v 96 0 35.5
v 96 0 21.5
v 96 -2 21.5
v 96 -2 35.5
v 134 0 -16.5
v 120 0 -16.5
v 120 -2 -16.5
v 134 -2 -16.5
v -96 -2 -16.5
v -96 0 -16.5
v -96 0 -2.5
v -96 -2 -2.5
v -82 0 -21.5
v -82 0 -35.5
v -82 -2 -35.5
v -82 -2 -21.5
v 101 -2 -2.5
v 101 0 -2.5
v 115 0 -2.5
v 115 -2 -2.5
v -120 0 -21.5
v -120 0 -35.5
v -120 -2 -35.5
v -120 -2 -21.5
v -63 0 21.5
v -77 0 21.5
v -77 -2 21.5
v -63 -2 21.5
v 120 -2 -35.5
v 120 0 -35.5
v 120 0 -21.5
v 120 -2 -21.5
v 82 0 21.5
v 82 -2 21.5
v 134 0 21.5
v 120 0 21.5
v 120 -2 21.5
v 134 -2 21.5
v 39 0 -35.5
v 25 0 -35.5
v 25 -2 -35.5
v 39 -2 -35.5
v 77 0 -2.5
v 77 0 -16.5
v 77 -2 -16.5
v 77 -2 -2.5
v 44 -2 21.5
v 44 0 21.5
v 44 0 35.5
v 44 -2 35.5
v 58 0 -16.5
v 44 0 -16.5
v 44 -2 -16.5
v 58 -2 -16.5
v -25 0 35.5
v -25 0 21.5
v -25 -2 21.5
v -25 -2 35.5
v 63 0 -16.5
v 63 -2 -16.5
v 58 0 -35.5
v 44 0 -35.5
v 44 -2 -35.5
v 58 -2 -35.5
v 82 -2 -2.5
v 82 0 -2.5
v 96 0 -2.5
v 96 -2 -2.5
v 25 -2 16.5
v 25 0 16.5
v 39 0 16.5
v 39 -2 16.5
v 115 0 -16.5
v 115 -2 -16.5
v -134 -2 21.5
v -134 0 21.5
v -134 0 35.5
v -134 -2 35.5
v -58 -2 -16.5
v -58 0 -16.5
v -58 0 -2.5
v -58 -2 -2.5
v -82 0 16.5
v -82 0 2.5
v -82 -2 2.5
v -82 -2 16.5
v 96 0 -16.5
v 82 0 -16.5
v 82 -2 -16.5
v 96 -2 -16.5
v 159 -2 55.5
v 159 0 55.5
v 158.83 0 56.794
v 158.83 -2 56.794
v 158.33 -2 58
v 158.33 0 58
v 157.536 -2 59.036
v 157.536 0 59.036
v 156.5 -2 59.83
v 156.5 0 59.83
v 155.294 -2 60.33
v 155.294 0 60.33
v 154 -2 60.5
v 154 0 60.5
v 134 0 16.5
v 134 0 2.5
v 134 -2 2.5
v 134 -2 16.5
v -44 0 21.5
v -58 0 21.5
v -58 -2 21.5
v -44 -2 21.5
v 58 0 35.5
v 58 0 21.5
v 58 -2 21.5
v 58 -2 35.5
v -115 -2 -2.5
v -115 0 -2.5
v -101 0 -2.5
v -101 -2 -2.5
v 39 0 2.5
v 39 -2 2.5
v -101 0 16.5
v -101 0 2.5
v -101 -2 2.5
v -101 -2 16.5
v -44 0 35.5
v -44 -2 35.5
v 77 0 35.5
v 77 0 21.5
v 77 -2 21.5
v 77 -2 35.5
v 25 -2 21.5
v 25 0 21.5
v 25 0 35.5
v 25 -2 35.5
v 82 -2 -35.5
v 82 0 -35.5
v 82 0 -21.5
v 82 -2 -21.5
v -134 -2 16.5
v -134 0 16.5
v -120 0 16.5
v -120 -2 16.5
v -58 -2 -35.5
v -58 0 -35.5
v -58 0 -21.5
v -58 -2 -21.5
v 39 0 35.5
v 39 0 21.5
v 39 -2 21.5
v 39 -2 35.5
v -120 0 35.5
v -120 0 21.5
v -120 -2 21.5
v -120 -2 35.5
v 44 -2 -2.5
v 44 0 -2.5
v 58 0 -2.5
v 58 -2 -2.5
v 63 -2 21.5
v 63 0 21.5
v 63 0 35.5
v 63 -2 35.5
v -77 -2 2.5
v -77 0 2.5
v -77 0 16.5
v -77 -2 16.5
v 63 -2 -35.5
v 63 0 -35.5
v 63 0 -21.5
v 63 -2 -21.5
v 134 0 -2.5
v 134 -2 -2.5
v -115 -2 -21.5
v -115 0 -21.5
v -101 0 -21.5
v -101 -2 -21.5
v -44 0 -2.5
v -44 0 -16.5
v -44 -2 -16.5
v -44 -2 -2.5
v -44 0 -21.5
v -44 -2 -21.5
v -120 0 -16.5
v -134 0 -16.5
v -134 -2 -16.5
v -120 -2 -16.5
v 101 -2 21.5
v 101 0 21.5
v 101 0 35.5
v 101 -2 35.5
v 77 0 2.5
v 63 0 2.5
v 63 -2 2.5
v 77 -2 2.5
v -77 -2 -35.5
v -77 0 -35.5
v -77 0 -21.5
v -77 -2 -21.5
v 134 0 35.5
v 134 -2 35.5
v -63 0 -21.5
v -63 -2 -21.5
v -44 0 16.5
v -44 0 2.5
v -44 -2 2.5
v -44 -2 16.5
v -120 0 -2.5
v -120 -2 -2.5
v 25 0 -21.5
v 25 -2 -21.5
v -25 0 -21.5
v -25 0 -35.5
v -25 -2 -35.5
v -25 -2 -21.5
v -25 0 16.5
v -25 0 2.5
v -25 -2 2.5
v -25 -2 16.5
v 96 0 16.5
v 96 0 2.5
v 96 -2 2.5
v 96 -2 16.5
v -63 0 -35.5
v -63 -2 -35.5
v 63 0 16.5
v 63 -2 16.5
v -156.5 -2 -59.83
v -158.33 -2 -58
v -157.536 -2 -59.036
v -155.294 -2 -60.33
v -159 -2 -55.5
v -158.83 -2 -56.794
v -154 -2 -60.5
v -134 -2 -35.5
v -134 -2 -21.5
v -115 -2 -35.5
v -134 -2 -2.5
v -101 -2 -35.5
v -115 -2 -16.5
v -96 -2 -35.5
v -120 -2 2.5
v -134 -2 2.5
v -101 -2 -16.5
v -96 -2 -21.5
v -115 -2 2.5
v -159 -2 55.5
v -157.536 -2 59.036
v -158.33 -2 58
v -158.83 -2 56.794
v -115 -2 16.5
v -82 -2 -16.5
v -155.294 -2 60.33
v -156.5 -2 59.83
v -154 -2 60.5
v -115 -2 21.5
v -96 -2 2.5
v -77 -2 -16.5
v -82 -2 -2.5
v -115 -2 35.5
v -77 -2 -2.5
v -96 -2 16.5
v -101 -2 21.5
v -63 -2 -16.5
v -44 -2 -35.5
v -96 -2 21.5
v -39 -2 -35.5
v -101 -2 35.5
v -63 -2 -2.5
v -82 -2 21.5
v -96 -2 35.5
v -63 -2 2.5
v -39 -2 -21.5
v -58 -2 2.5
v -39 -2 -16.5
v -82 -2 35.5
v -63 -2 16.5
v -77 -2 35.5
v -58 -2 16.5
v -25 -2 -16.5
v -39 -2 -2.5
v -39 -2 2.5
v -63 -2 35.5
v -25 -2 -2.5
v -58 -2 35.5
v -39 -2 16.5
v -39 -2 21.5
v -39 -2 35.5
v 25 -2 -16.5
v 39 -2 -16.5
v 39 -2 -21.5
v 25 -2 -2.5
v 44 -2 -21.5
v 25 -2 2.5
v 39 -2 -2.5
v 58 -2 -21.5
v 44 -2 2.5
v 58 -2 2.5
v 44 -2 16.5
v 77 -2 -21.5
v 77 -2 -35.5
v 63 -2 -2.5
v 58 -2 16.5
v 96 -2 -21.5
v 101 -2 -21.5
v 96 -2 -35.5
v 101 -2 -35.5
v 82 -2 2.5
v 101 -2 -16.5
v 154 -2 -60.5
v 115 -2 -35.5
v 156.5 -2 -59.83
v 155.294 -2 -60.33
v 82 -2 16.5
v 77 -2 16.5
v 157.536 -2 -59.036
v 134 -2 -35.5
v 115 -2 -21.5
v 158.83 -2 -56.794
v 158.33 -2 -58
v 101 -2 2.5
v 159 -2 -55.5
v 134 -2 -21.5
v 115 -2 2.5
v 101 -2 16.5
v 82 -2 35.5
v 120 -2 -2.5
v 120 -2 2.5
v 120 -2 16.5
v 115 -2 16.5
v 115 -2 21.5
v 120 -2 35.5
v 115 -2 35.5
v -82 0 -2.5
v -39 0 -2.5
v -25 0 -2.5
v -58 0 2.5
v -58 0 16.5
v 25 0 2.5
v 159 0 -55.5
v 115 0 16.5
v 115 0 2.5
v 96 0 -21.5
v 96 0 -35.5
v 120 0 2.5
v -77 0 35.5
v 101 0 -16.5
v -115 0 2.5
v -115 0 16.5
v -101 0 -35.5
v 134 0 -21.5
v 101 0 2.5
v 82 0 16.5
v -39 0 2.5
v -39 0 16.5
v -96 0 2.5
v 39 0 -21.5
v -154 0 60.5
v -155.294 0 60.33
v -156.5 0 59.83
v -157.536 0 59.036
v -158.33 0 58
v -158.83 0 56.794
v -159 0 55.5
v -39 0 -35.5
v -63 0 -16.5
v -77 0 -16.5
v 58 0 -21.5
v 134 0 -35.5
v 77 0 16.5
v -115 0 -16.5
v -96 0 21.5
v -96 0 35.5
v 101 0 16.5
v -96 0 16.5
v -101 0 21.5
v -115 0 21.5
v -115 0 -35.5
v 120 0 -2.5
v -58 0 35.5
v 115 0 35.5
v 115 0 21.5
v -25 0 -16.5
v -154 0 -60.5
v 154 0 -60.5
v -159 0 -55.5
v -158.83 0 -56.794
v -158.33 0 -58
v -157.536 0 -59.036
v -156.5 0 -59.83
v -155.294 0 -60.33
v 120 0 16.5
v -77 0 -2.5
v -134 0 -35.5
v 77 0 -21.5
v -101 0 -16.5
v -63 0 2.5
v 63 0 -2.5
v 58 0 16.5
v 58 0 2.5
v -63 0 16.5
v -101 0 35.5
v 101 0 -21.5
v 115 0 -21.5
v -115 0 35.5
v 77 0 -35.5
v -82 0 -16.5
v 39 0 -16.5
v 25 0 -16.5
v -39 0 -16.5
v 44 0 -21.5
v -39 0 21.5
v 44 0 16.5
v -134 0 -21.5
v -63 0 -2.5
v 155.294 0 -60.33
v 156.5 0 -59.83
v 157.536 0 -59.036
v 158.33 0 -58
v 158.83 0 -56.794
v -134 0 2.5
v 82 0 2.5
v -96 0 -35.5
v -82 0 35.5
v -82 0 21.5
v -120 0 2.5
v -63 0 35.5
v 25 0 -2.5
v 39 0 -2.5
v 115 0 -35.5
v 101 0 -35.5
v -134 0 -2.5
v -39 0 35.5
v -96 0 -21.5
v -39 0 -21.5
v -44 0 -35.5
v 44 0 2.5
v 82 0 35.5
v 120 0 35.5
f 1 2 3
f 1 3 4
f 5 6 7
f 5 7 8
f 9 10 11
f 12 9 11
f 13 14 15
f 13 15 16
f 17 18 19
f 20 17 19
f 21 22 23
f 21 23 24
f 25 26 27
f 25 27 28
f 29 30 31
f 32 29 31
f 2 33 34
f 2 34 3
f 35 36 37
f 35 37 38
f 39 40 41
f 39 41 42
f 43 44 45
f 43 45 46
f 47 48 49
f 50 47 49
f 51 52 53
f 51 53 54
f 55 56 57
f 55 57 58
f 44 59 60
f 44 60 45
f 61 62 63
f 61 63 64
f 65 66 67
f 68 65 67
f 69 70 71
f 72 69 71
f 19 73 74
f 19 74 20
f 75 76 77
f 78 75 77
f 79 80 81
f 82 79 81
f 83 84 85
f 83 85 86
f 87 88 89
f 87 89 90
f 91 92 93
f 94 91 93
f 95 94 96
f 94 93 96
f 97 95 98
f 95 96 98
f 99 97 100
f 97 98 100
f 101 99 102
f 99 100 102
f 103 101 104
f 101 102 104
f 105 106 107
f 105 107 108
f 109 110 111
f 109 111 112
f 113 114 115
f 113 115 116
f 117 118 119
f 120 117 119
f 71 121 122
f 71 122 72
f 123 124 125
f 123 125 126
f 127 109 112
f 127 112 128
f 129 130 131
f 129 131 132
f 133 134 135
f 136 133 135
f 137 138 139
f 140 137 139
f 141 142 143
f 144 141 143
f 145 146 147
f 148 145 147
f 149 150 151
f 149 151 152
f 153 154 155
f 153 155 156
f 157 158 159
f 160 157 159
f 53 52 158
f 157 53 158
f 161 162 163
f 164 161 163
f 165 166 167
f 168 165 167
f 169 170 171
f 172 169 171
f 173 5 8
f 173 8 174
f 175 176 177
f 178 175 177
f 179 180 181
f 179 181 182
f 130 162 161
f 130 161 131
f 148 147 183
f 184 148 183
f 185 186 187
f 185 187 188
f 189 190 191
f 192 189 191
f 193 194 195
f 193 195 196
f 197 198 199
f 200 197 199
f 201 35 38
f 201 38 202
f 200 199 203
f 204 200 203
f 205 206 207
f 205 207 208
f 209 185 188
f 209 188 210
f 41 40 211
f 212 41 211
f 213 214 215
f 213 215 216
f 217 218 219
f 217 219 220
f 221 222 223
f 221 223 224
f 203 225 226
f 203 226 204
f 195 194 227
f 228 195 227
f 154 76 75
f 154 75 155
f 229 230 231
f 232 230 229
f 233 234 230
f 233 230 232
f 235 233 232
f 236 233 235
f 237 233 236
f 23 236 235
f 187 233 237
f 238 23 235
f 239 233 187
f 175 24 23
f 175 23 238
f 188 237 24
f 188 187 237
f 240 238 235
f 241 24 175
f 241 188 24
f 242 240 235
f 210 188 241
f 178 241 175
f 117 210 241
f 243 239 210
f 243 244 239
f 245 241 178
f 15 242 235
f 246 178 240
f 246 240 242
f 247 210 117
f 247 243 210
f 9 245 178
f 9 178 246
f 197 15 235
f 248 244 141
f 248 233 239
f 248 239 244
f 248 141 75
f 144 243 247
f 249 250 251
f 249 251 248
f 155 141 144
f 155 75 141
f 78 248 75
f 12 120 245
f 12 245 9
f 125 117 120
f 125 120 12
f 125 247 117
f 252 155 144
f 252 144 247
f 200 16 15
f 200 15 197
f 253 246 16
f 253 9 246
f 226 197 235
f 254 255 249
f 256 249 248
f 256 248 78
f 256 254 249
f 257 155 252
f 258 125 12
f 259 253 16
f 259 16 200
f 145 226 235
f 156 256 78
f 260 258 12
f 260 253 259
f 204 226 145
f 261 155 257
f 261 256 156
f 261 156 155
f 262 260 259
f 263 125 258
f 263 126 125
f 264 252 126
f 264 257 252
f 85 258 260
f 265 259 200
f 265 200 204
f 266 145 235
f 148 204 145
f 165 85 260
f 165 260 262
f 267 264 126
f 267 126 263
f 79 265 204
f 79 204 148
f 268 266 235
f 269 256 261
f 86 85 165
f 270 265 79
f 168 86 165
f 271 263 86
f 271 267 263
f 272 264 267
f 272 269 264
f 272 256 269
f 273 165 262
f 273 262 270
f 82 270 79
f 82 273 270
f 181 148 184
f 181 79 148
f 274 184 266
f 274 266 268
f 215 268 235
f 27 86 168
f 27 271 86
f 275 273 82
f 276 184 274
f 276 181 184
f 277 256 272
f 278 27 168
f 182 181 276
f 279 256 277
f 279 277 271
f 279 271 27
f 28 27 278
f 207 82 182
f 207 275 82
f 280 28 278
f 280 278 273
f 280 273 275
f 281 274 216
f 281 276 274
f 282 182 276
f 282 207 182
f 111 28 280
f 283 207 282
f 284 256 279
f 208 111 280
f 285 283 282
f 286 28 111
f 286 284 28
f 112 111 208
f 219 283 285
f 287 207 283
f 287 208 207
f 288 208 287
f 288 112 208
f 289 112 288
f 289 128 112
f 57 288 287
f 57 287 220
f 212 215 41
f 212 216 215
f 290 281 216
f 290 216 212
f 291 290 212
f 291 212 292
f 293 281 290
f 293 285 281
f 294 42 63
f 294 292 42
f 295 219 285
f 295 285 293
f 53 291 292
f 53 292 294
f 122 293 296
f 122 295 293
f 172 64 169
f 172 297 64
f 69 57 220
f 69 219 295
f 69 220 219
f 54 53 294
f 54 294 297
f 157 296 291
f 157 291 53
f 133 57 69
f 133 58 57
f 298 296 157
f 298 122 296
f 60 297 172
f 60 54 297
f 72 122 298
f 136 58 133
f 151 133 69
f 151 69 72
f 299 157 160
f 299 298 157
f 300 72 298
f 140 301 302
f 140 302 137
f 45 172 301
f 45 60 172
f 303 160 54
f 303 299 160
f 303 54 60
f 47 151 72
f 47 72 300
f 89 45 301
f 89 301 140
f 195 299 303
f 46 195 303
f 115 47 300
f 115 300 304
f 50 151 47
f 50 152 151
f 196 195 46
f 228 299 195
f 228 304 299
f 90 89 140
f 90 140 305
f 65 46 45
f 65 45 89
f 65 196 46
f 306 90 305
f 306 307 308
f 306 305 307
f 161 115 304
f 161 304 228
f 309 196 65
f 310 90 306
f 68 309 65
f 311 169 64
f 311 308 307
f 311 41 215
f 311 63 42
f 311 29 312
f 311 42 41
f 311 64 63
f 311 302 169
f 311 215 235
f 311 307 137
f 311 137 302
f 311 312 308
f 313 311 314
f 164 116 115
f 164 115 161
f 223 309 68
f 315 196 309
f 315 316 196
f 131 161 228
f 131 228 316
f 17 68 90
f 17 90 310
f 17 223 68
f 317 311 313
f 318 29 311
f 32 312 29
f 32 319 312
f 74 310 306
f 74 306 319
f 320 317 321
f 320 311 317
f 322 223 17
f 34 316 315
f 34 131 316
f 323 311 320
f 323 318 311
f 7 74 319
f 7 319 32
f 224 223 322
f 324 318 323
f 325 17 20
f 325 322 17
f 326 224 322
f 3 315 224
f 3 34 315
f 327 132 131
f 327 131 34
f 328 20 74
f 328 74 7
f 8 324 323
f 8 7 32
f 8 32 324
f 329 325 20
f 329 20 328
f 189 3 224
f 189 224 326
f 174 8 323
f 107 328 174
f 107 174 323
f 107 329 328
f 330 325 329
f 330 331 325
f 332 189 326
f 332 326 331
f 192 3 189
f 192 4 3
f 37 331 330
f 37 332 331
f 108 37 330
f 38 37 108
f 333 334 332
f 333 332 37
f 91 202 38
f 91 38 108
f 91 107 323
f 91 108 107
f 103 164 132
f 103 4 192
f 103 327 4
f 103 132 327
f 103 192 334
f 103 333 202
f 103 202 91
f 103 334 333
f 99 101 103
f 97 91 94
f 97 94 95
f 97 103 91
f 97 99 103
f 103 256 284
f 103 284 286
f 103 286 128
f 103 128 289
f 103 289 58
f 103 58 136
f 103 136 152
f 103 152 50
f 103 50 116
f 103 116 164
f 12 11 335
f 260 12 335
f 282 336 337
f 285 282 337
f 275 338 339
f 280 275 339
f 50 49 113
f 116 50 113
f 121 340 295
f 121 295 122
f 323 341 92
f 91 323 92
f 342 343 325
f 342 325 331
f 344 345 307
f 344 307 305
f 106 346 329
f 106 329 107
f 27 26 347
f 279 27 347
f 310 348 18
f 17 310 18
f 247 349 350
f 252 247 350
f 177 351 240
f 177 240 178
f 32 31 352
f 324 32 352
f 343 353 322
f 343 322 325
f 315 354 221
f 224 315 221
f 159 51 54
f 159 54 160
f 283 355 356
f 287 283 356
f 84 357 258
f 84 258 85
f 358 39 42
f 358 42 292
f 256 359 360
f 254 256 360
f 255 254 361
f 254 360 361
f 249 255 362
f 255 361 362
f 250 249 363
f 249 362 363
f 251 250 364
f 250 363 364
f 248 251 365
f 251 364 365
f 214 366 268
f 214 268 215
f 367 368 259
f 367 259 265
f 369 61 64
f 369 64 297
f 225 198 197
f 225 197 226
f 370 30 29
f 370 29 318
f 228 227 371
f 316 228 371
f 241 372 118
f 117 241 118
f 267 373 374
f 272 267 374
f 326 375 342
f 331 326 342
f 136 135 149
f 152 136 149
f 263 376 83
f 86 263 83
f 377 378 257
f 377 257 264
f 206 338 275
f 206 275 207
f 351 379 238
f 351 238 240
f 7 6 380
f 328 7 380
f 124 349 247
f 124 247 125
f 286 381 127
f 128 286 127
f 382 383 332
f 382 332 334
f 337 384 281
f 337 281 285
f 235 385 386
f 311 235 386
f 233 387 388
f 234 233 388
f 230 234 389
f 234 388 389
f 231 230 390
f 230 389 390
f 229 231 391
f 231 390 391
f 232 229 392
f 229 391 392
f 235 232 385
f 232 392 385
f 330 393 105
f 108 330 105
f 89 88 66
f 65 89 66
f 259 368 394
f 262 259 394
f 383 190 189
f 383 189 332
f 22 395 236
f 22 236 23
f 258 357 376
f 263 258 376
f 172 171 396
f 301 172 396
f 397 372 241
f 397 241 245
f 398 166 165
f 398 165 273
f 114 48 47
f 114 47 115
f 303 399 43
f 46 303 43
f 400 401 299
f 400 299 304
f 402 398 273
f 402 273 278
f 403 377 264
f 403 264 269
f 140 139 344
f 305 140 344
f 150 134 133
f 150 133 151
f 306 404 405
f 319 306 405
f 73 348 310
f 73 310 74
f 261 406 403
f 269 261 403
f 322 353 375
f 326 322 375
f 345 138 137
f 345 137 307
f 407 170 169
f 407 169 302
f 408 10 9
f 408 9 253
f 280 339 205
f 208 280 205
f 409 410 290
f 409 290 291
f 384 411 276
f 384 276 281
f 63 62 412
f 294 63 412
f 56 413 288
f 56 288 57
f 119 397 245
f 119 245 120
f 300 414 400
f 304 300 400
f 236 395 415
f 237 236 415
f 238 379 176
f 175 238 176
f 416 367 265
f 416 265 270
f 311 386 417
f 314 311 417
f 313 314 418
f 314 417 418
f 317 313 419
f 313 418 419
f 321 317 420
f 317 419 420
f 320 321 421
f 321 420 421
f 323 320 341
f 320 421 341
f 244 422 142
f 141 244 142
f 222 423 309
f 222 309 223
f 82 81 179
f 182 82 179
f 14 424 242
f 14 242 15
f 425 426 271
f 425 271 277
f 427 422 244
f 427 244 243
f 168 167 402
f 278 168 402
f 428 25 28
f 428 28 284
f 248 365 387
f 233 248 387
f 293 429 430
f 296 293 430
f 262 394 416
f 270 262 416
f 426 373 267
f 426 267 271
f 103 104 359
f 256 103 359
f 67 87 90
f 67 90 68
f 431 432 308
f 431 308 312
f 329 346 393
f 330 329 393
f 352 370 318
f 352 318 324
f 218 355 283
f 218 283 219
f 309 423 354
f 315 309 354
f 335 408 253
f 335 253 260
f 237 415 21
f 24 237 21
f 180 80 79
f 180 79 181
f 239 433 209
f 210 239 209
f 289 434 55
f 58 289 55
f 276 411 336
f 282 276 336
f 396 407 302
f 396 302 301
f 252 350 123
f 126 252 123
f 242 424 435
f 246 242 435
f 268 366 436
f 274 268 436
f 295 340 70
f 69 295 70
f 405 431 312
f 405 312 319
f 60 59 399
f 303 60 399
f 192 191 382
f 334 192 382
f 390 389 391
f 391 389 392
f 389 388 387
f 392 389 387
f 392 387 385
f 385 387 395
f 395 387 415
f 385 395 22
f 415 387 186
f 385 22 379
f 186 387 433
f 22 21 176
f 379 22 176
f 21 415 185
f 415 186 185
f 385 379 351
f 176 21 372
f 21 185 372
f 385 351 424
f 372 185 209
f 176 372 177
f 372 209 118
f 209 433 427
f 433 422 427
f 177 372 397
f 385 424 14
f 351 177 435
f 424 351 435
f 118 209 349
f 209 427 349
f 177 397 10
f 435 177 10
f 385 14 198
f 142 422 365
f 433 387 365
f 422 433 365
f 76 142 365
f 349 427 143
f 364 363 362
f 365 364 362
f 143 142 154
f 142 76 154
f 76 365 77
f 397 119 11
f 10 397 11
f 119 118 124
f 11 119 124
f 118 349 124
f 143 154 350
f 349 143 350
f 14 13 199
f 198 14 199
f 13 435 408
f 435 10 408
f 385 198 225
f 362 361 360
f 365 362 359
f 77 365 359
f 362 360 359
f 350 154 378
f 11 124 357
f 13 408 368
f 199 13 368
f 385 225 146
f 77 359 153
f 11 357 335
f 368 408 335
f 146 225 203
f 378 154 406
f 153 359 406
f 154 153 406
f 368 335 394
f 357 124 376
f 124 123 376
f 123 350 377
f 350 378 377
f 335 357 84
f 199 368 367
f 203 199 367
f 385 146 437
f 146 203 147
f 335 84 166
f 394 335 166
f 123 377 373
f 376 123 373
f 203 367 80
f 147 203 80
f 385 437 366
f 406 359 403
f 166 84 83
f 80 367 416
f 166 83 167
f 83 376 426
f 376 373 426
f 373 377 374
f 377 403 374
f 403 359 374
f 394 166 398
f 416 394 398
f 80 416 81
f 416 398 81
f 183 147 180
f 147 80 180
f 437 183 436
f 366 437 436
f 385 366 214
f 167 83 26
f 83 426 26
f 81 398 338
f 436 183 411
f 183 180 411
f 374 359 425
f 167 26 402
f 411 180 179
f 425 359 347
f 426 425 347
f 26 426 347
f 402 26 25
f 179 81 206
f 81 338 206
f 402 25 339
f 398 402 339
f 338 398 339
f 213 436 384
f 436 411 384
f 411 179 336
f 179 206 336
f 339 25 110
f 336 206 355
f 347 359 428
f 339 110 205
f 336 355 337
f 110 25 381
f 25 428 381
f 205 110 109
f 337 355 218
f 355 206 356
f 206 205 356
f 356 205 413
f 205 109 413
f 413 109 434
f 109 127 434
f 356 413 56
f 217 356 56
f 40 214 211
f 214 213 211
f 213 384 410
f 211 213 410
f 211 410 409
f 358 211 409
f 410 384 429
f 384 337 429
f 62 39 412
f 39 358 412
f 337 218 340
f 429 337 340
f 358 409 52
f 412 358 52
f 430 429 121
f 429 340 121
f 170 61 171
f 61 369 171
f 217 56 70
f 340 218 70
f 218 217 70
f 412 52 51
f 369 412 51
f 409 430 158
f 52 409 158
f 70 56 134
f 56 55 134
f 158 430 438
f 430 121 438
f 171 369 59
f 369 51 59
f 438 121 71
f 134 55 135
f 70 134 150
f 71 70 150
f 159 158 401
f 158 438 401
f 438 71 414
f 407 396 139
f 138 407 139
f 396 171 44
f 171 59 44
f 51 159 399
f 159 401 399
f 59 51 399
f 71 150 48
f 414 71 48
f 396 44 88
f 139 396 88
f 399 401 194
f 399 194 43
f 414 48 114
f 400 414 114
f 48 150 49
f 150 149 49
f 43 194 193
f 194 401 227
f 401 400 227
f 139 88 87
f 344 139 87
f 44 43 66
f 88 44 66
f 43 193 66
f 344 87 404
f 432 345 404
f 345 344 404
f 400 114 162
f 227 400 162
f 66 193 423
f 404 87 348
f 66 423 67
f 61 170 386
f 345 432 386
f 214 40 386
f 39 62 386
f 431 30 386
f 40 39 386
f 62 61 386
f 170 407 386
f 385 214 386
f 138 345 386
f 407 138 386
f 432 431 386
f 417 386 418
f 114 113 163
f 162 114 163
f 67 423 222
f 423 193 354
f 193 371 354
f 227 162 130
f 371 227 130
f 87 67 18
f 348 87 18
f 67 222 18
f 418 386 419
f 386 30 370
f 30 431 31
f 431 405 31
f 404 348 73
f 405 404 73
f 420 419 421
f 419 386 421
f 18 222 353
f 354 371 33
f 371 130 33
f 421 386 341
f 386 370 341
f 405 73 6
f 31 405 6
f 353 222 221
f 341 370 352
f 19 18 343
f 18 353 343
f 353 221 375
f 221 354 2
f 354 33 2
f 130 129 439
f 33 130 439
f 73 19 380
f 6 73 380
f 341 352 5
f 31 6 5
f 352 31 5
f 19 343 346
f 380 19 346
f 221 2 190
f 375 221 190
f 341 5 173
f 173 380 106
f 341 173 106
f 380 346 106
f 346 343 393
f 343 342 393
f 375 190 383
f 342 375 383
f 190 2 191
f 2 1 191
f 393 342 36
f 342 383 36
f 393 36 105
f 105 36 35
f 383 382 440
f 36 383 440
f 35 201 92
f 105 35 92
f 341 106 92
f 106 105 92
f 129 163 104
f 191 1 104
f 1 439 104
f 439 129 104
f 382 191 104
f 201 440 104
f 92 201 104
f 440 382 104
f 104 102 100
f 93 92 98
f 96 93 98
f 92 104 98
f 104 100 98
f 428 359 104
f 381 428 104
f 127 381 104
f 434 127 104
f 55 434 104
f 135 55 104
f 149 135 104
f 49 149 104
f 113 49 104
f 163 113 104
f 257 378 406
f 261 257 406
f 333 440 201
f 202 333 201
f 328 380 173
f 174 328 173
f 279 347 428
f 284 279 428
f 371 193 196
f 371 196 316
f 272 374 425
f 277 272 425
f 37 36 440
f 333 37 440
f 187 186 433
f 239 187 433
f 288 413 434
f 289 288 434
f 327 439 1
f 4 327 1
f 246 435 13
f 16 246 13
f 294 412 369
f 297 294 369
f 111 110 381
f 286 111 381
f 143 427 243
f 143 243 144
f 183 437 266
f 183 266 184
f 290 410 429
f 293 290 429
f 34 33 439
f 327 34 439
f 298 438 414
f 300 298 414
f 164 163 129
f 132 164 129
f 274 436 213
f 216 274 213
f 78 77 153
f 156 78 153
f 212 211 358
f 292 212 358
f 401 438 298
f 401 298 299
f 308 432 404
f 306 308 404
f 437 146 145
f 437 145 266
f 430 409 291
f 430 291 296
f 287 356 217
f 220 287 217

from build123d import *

# Parameters (mm, degrees)
F0_W     = 14
F0_H     = 14
F1_DEPTH = 2


with BuildPart() as f1:
    # F0 (on Front) → F1 (new body)
    with BuildSketch(Plane.XZ):
        with BuildLine():
            Line((154, 60.5), (-154, 60.5))
            ThreePointArc((-154, 60.5), (-157.535534, 59.035534), (-159, 55.5))
            Line((-159, 55.5), (-159, -55.5))
            ThreePointArc((-159, -55.5), (-157.535534, -59.035534), (-154, -60.5))
            Line((-154, -60.5), (154, -60.5))
            ThreePointArc((154, -60.5), (157.535534, -59.035534), (159, -55.5))
            Line((159, -55.5), (159, 55.5))
            ThreePointArc((159, 55.5), (157.535534, 59.035534), (154, 60.5))
        make_face()
        with Locations((-127, -28.5)):
            Rectangle(F0_W, F0_H, mode=Mode.SUBTRACT)
        with Locations((-108, -28.5)):
            Rectangle(F0_W, F0_H, mode=Mode.SUBTRACT)
        with Locations((-89, -28.5)):
            Rectangle(F0_W, F0_H, mode=Mode.SUBTRACT)
        with Locations((-127, -9.5)):
            Rectangle(F0_W, F0_H, mode=Mode.SUBTRACT)
        with Locations((-108, -9.5)):
            Rectangle(F0_W, F0_H, mode=Mode.SUBTRACT)
        with Locations((-89, -9.5)):
            Rectangle(F0_W, F0_H, mode=Mode.SUBTRACT)
        with Locations((-70, -28.5)):
            Rectangle(F0_W, F0_H, mode=Mode.SUBTRACT)
        with Locations((-51, -28.5)):
            Rectangle(F0_W, F0_H, mode=Mode.SUBTRACT)
        with Locations((-32, -28.5)):
            Rectangle(F0_W, F0_H, mode=Mode.SUBTRACT)
        with Locations((-70, -9.5)):
            Rectangle(F0_W, F0_H, mode=Mode.SUBTRACT)
        with Locations((-51, -9.5)):
            Rectangle(F0_W, F0_H, mode=Mode.SUBTRACT)
        with Locations((-32, -9.5)):
            Rectangle(F0_W, F0_H, mode=Mode.SUBTRACT)
        with Locations((32, -28.5)):
            Rectangle(F0_W, F0_H, mode=Mode.SUBTRACT)
        with Locations((51, -28.5)):
            Rectangle(F0_W, F0_H, mode=Mode.SUBTRACT)
        with Locations((70, -28.5)):
            Rectangle(F0_W, F0_H, mode=Mode.SUBTRACT)
        with Locations((32, -9.5)):
            Rectangle(F0_W, F0_H, mode=Mode.SUBTRACT)
        with Locations((51, -9.5)):
            Rectangle(F0_W, F0_H, mode=Mode.SUBTRACT)
        with Locations((70, -9.5)):
            Rectangle(F0_W, F0_H, mode=Mode.SUBTRACT)
        with Locations((89, -28.5)):
            Rectangle(F0_W, F0_H, mode=Mode.SUBTRACT)
        with Locations((108, -28.5)):
            Rectangle(F0_W, F0_H, mode=Mode.SUBTRACT)
        with Locations((127, -28.5)):
            Rectangle(F0_W, F0_H, mode=Mode.SUBTRACT)
        with Locations((89, -9.5)):
            Rectangle(F0_W, F0_H, mode=Mode.SUBTRACT)
        with Locations((108, -9.5)):
            Rectangle(F0_W, F0_H, mode=Mode.SUBTRACT)
        with Locations((127, -9.5)):
            Rectangle(F0_W, F0_H, mode=Mode.SUBTRACT)
        with Locations((-127, 9.5)):
            Rectangle(F0_W, F0_H, mode=Mode.SUBTRACT)
        with Locations((-108, 9.5)):
            Rectangle(F0_W, F0_H, mode=Mode.SUBTRACT)
        with Locations((-89, 9.5)):
            Rectangle(F0_W, F0_H, mode=Mode.SUBTRACT)
        with Locations((-127, 28.5)):
            Rectangle(F0_W, F0_H, mode=Mode.SUBTRACT)
        with Locations((-108, 28.5)):
            Rectangle(F0_W, F0_H, mode=Mode.SUBTRACT)
        with Locations((-89, 28.5)):
            Rectangle(F0_W, F0_H, mode=Mode.SUBTRACT)
        with Locations((-70, 9.5)):
            Rectangle(F0_W, F0_H, mode=Mode.SUBTRACT)
        with Locations((-51, 9.5)):
            Rectangle(F0_W, F0_H, mode=Mode.SUBTRACT)
        with Locations((-32, 9.5)):
            Rectangle(F0_W, F0_H, mode=Mode.SUBTRACT)
        with Locations((-70, 28.5)):
            Rectangle(F0_W, F0_H, mode=Mode.SUBTRACT)
        with Locations((-51, 28.5)):
            Rectangle(F0_W, F0_H, mode=Mode.SUBTRACT)
        with Locations((-32, 28.5)):
            Rectangle(F0_W, F0_H, mode=Mode.SUBTRACT)
        with Locations((32, 9.5)):
            Rectangle(F0_W, F0_H, mode=Mode.SUBTRACT)
        with Locations((51, 9.5)):
            Rectangle(F0_W, F0_H, mode=Mode.SUBTRACT)
        with Locations((70, 9.5)):
            Rectangle(F0_W, F0_H, mode=Mode.SUBTRACT)
        with Locations((32, 28.5)):
            Rectangle(F0_W, F0_H, mode=Mode.SUBTRACT)
        with Locations((51, 28.5)):
            Rectangle(F0_W, F0_H, mode=Mode.SUBTRACT)
        with Locations((70, 28.5)):
            Rectangle(F0_W, F0_H, mode=Mode.SUBTRACT)
        with Locations((89, 9.5)):
            Rectangle(F0_W, F0_H, mode=Mode.SUBTRACT)
        with Locations((108, 9.5)):
            Rectangle(F0_W, F0_H, mode=Mode.SUBTRACT)
        with Locations((127, 9.5)):
            Rectangle(F0_W, F0_H, mode=Mode.SUBTRACT)
        with Locations((89, 28.5)):
            Rectangle(F0_W, F0_H, mode=Mode.SUBTRACT)
        with Locations((108, 28.5)):
            Rectangle(F0_W, F0_H, mode=Mode.SUBTRACT)
        with Locations((127, 28.5)):
            Rectangle(F0_W, F0_H, mode=Mode.SUBTRACT)
    extrude(amount=F1_DEPTH)


solid = f1.part
